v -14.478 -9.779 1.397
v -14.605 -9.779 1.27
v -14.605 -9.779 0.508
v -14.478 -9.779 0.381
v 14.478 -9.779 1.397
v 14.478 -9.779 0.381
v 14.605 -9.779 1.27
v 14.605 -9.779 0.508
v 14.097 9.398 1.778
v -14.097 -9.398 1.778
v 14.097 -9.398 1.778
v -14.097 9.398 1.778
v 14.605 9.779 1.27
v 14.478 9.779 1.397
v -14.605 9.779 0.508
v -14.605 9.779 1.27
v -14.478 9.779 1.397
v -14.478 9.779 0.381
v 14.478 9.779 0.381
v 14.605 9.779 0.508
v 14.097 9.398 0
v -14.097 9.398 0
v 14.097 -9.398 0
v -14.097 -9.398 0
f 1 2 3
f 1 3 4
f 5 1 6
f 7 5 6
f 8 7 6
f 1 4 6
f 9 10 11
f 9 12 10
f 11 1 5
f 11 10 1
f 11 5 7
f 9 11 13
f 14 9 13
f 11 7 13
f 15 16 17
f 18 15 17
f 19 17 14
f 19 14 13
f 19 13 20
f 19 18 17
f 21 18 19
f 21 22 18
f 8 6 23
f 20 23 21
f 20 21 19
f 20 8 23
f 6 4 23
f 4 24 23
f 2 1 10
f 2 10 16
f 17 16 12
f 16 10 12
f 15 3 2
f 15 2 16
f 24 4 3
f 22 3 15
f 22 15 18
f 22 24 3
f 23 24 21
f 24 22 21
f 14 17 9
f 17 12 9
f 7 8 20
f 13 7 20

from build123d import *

# Parameters (mm, degrees)
SKETCH3_W           = 29.21
SKETCH3_H           = 19.558
BOSS_EXTRUDE1_DEPTH = 1.778
CHAMFER1_SIZE       = 0.381
CHAMFER2_SIZE       = 0.508


with BuildPart() as part:
    # Sketch3 → Boss-Extrude1 (new body)
    with BuildSketch(Plane.XY):
        Rectangle(SKETCH3_W, SKETCH3_H)
    extrude(amount=BOSS_EXTRUDE1_DEPTH)

    # Chamfer1
    chamfer1_edges = [part.edges().sort_by_distance(p)[0] for p in [
        (0, -9.779, 1.778),
        (0, -9.779, 0),
        (0, 9.779, 0),
        (0, 9.779, 1.778),
    ]]
    chamfer(chamfer1_edges, length=CHAMFER1_SIZE)

    # Chamfer2
    chamfer2_edges = [part.edges().sort_by_distance(p)[0] for p in [
        (14.605, 0, 1.778),
        (14.605, 0, 0),
        (-14.605, 0, 0),
        (-14.605, 0, 1.778),
    ]]
    chamfer(chamfer2_edges, length=CHAMFER2_SIZE)


solid = part.part
